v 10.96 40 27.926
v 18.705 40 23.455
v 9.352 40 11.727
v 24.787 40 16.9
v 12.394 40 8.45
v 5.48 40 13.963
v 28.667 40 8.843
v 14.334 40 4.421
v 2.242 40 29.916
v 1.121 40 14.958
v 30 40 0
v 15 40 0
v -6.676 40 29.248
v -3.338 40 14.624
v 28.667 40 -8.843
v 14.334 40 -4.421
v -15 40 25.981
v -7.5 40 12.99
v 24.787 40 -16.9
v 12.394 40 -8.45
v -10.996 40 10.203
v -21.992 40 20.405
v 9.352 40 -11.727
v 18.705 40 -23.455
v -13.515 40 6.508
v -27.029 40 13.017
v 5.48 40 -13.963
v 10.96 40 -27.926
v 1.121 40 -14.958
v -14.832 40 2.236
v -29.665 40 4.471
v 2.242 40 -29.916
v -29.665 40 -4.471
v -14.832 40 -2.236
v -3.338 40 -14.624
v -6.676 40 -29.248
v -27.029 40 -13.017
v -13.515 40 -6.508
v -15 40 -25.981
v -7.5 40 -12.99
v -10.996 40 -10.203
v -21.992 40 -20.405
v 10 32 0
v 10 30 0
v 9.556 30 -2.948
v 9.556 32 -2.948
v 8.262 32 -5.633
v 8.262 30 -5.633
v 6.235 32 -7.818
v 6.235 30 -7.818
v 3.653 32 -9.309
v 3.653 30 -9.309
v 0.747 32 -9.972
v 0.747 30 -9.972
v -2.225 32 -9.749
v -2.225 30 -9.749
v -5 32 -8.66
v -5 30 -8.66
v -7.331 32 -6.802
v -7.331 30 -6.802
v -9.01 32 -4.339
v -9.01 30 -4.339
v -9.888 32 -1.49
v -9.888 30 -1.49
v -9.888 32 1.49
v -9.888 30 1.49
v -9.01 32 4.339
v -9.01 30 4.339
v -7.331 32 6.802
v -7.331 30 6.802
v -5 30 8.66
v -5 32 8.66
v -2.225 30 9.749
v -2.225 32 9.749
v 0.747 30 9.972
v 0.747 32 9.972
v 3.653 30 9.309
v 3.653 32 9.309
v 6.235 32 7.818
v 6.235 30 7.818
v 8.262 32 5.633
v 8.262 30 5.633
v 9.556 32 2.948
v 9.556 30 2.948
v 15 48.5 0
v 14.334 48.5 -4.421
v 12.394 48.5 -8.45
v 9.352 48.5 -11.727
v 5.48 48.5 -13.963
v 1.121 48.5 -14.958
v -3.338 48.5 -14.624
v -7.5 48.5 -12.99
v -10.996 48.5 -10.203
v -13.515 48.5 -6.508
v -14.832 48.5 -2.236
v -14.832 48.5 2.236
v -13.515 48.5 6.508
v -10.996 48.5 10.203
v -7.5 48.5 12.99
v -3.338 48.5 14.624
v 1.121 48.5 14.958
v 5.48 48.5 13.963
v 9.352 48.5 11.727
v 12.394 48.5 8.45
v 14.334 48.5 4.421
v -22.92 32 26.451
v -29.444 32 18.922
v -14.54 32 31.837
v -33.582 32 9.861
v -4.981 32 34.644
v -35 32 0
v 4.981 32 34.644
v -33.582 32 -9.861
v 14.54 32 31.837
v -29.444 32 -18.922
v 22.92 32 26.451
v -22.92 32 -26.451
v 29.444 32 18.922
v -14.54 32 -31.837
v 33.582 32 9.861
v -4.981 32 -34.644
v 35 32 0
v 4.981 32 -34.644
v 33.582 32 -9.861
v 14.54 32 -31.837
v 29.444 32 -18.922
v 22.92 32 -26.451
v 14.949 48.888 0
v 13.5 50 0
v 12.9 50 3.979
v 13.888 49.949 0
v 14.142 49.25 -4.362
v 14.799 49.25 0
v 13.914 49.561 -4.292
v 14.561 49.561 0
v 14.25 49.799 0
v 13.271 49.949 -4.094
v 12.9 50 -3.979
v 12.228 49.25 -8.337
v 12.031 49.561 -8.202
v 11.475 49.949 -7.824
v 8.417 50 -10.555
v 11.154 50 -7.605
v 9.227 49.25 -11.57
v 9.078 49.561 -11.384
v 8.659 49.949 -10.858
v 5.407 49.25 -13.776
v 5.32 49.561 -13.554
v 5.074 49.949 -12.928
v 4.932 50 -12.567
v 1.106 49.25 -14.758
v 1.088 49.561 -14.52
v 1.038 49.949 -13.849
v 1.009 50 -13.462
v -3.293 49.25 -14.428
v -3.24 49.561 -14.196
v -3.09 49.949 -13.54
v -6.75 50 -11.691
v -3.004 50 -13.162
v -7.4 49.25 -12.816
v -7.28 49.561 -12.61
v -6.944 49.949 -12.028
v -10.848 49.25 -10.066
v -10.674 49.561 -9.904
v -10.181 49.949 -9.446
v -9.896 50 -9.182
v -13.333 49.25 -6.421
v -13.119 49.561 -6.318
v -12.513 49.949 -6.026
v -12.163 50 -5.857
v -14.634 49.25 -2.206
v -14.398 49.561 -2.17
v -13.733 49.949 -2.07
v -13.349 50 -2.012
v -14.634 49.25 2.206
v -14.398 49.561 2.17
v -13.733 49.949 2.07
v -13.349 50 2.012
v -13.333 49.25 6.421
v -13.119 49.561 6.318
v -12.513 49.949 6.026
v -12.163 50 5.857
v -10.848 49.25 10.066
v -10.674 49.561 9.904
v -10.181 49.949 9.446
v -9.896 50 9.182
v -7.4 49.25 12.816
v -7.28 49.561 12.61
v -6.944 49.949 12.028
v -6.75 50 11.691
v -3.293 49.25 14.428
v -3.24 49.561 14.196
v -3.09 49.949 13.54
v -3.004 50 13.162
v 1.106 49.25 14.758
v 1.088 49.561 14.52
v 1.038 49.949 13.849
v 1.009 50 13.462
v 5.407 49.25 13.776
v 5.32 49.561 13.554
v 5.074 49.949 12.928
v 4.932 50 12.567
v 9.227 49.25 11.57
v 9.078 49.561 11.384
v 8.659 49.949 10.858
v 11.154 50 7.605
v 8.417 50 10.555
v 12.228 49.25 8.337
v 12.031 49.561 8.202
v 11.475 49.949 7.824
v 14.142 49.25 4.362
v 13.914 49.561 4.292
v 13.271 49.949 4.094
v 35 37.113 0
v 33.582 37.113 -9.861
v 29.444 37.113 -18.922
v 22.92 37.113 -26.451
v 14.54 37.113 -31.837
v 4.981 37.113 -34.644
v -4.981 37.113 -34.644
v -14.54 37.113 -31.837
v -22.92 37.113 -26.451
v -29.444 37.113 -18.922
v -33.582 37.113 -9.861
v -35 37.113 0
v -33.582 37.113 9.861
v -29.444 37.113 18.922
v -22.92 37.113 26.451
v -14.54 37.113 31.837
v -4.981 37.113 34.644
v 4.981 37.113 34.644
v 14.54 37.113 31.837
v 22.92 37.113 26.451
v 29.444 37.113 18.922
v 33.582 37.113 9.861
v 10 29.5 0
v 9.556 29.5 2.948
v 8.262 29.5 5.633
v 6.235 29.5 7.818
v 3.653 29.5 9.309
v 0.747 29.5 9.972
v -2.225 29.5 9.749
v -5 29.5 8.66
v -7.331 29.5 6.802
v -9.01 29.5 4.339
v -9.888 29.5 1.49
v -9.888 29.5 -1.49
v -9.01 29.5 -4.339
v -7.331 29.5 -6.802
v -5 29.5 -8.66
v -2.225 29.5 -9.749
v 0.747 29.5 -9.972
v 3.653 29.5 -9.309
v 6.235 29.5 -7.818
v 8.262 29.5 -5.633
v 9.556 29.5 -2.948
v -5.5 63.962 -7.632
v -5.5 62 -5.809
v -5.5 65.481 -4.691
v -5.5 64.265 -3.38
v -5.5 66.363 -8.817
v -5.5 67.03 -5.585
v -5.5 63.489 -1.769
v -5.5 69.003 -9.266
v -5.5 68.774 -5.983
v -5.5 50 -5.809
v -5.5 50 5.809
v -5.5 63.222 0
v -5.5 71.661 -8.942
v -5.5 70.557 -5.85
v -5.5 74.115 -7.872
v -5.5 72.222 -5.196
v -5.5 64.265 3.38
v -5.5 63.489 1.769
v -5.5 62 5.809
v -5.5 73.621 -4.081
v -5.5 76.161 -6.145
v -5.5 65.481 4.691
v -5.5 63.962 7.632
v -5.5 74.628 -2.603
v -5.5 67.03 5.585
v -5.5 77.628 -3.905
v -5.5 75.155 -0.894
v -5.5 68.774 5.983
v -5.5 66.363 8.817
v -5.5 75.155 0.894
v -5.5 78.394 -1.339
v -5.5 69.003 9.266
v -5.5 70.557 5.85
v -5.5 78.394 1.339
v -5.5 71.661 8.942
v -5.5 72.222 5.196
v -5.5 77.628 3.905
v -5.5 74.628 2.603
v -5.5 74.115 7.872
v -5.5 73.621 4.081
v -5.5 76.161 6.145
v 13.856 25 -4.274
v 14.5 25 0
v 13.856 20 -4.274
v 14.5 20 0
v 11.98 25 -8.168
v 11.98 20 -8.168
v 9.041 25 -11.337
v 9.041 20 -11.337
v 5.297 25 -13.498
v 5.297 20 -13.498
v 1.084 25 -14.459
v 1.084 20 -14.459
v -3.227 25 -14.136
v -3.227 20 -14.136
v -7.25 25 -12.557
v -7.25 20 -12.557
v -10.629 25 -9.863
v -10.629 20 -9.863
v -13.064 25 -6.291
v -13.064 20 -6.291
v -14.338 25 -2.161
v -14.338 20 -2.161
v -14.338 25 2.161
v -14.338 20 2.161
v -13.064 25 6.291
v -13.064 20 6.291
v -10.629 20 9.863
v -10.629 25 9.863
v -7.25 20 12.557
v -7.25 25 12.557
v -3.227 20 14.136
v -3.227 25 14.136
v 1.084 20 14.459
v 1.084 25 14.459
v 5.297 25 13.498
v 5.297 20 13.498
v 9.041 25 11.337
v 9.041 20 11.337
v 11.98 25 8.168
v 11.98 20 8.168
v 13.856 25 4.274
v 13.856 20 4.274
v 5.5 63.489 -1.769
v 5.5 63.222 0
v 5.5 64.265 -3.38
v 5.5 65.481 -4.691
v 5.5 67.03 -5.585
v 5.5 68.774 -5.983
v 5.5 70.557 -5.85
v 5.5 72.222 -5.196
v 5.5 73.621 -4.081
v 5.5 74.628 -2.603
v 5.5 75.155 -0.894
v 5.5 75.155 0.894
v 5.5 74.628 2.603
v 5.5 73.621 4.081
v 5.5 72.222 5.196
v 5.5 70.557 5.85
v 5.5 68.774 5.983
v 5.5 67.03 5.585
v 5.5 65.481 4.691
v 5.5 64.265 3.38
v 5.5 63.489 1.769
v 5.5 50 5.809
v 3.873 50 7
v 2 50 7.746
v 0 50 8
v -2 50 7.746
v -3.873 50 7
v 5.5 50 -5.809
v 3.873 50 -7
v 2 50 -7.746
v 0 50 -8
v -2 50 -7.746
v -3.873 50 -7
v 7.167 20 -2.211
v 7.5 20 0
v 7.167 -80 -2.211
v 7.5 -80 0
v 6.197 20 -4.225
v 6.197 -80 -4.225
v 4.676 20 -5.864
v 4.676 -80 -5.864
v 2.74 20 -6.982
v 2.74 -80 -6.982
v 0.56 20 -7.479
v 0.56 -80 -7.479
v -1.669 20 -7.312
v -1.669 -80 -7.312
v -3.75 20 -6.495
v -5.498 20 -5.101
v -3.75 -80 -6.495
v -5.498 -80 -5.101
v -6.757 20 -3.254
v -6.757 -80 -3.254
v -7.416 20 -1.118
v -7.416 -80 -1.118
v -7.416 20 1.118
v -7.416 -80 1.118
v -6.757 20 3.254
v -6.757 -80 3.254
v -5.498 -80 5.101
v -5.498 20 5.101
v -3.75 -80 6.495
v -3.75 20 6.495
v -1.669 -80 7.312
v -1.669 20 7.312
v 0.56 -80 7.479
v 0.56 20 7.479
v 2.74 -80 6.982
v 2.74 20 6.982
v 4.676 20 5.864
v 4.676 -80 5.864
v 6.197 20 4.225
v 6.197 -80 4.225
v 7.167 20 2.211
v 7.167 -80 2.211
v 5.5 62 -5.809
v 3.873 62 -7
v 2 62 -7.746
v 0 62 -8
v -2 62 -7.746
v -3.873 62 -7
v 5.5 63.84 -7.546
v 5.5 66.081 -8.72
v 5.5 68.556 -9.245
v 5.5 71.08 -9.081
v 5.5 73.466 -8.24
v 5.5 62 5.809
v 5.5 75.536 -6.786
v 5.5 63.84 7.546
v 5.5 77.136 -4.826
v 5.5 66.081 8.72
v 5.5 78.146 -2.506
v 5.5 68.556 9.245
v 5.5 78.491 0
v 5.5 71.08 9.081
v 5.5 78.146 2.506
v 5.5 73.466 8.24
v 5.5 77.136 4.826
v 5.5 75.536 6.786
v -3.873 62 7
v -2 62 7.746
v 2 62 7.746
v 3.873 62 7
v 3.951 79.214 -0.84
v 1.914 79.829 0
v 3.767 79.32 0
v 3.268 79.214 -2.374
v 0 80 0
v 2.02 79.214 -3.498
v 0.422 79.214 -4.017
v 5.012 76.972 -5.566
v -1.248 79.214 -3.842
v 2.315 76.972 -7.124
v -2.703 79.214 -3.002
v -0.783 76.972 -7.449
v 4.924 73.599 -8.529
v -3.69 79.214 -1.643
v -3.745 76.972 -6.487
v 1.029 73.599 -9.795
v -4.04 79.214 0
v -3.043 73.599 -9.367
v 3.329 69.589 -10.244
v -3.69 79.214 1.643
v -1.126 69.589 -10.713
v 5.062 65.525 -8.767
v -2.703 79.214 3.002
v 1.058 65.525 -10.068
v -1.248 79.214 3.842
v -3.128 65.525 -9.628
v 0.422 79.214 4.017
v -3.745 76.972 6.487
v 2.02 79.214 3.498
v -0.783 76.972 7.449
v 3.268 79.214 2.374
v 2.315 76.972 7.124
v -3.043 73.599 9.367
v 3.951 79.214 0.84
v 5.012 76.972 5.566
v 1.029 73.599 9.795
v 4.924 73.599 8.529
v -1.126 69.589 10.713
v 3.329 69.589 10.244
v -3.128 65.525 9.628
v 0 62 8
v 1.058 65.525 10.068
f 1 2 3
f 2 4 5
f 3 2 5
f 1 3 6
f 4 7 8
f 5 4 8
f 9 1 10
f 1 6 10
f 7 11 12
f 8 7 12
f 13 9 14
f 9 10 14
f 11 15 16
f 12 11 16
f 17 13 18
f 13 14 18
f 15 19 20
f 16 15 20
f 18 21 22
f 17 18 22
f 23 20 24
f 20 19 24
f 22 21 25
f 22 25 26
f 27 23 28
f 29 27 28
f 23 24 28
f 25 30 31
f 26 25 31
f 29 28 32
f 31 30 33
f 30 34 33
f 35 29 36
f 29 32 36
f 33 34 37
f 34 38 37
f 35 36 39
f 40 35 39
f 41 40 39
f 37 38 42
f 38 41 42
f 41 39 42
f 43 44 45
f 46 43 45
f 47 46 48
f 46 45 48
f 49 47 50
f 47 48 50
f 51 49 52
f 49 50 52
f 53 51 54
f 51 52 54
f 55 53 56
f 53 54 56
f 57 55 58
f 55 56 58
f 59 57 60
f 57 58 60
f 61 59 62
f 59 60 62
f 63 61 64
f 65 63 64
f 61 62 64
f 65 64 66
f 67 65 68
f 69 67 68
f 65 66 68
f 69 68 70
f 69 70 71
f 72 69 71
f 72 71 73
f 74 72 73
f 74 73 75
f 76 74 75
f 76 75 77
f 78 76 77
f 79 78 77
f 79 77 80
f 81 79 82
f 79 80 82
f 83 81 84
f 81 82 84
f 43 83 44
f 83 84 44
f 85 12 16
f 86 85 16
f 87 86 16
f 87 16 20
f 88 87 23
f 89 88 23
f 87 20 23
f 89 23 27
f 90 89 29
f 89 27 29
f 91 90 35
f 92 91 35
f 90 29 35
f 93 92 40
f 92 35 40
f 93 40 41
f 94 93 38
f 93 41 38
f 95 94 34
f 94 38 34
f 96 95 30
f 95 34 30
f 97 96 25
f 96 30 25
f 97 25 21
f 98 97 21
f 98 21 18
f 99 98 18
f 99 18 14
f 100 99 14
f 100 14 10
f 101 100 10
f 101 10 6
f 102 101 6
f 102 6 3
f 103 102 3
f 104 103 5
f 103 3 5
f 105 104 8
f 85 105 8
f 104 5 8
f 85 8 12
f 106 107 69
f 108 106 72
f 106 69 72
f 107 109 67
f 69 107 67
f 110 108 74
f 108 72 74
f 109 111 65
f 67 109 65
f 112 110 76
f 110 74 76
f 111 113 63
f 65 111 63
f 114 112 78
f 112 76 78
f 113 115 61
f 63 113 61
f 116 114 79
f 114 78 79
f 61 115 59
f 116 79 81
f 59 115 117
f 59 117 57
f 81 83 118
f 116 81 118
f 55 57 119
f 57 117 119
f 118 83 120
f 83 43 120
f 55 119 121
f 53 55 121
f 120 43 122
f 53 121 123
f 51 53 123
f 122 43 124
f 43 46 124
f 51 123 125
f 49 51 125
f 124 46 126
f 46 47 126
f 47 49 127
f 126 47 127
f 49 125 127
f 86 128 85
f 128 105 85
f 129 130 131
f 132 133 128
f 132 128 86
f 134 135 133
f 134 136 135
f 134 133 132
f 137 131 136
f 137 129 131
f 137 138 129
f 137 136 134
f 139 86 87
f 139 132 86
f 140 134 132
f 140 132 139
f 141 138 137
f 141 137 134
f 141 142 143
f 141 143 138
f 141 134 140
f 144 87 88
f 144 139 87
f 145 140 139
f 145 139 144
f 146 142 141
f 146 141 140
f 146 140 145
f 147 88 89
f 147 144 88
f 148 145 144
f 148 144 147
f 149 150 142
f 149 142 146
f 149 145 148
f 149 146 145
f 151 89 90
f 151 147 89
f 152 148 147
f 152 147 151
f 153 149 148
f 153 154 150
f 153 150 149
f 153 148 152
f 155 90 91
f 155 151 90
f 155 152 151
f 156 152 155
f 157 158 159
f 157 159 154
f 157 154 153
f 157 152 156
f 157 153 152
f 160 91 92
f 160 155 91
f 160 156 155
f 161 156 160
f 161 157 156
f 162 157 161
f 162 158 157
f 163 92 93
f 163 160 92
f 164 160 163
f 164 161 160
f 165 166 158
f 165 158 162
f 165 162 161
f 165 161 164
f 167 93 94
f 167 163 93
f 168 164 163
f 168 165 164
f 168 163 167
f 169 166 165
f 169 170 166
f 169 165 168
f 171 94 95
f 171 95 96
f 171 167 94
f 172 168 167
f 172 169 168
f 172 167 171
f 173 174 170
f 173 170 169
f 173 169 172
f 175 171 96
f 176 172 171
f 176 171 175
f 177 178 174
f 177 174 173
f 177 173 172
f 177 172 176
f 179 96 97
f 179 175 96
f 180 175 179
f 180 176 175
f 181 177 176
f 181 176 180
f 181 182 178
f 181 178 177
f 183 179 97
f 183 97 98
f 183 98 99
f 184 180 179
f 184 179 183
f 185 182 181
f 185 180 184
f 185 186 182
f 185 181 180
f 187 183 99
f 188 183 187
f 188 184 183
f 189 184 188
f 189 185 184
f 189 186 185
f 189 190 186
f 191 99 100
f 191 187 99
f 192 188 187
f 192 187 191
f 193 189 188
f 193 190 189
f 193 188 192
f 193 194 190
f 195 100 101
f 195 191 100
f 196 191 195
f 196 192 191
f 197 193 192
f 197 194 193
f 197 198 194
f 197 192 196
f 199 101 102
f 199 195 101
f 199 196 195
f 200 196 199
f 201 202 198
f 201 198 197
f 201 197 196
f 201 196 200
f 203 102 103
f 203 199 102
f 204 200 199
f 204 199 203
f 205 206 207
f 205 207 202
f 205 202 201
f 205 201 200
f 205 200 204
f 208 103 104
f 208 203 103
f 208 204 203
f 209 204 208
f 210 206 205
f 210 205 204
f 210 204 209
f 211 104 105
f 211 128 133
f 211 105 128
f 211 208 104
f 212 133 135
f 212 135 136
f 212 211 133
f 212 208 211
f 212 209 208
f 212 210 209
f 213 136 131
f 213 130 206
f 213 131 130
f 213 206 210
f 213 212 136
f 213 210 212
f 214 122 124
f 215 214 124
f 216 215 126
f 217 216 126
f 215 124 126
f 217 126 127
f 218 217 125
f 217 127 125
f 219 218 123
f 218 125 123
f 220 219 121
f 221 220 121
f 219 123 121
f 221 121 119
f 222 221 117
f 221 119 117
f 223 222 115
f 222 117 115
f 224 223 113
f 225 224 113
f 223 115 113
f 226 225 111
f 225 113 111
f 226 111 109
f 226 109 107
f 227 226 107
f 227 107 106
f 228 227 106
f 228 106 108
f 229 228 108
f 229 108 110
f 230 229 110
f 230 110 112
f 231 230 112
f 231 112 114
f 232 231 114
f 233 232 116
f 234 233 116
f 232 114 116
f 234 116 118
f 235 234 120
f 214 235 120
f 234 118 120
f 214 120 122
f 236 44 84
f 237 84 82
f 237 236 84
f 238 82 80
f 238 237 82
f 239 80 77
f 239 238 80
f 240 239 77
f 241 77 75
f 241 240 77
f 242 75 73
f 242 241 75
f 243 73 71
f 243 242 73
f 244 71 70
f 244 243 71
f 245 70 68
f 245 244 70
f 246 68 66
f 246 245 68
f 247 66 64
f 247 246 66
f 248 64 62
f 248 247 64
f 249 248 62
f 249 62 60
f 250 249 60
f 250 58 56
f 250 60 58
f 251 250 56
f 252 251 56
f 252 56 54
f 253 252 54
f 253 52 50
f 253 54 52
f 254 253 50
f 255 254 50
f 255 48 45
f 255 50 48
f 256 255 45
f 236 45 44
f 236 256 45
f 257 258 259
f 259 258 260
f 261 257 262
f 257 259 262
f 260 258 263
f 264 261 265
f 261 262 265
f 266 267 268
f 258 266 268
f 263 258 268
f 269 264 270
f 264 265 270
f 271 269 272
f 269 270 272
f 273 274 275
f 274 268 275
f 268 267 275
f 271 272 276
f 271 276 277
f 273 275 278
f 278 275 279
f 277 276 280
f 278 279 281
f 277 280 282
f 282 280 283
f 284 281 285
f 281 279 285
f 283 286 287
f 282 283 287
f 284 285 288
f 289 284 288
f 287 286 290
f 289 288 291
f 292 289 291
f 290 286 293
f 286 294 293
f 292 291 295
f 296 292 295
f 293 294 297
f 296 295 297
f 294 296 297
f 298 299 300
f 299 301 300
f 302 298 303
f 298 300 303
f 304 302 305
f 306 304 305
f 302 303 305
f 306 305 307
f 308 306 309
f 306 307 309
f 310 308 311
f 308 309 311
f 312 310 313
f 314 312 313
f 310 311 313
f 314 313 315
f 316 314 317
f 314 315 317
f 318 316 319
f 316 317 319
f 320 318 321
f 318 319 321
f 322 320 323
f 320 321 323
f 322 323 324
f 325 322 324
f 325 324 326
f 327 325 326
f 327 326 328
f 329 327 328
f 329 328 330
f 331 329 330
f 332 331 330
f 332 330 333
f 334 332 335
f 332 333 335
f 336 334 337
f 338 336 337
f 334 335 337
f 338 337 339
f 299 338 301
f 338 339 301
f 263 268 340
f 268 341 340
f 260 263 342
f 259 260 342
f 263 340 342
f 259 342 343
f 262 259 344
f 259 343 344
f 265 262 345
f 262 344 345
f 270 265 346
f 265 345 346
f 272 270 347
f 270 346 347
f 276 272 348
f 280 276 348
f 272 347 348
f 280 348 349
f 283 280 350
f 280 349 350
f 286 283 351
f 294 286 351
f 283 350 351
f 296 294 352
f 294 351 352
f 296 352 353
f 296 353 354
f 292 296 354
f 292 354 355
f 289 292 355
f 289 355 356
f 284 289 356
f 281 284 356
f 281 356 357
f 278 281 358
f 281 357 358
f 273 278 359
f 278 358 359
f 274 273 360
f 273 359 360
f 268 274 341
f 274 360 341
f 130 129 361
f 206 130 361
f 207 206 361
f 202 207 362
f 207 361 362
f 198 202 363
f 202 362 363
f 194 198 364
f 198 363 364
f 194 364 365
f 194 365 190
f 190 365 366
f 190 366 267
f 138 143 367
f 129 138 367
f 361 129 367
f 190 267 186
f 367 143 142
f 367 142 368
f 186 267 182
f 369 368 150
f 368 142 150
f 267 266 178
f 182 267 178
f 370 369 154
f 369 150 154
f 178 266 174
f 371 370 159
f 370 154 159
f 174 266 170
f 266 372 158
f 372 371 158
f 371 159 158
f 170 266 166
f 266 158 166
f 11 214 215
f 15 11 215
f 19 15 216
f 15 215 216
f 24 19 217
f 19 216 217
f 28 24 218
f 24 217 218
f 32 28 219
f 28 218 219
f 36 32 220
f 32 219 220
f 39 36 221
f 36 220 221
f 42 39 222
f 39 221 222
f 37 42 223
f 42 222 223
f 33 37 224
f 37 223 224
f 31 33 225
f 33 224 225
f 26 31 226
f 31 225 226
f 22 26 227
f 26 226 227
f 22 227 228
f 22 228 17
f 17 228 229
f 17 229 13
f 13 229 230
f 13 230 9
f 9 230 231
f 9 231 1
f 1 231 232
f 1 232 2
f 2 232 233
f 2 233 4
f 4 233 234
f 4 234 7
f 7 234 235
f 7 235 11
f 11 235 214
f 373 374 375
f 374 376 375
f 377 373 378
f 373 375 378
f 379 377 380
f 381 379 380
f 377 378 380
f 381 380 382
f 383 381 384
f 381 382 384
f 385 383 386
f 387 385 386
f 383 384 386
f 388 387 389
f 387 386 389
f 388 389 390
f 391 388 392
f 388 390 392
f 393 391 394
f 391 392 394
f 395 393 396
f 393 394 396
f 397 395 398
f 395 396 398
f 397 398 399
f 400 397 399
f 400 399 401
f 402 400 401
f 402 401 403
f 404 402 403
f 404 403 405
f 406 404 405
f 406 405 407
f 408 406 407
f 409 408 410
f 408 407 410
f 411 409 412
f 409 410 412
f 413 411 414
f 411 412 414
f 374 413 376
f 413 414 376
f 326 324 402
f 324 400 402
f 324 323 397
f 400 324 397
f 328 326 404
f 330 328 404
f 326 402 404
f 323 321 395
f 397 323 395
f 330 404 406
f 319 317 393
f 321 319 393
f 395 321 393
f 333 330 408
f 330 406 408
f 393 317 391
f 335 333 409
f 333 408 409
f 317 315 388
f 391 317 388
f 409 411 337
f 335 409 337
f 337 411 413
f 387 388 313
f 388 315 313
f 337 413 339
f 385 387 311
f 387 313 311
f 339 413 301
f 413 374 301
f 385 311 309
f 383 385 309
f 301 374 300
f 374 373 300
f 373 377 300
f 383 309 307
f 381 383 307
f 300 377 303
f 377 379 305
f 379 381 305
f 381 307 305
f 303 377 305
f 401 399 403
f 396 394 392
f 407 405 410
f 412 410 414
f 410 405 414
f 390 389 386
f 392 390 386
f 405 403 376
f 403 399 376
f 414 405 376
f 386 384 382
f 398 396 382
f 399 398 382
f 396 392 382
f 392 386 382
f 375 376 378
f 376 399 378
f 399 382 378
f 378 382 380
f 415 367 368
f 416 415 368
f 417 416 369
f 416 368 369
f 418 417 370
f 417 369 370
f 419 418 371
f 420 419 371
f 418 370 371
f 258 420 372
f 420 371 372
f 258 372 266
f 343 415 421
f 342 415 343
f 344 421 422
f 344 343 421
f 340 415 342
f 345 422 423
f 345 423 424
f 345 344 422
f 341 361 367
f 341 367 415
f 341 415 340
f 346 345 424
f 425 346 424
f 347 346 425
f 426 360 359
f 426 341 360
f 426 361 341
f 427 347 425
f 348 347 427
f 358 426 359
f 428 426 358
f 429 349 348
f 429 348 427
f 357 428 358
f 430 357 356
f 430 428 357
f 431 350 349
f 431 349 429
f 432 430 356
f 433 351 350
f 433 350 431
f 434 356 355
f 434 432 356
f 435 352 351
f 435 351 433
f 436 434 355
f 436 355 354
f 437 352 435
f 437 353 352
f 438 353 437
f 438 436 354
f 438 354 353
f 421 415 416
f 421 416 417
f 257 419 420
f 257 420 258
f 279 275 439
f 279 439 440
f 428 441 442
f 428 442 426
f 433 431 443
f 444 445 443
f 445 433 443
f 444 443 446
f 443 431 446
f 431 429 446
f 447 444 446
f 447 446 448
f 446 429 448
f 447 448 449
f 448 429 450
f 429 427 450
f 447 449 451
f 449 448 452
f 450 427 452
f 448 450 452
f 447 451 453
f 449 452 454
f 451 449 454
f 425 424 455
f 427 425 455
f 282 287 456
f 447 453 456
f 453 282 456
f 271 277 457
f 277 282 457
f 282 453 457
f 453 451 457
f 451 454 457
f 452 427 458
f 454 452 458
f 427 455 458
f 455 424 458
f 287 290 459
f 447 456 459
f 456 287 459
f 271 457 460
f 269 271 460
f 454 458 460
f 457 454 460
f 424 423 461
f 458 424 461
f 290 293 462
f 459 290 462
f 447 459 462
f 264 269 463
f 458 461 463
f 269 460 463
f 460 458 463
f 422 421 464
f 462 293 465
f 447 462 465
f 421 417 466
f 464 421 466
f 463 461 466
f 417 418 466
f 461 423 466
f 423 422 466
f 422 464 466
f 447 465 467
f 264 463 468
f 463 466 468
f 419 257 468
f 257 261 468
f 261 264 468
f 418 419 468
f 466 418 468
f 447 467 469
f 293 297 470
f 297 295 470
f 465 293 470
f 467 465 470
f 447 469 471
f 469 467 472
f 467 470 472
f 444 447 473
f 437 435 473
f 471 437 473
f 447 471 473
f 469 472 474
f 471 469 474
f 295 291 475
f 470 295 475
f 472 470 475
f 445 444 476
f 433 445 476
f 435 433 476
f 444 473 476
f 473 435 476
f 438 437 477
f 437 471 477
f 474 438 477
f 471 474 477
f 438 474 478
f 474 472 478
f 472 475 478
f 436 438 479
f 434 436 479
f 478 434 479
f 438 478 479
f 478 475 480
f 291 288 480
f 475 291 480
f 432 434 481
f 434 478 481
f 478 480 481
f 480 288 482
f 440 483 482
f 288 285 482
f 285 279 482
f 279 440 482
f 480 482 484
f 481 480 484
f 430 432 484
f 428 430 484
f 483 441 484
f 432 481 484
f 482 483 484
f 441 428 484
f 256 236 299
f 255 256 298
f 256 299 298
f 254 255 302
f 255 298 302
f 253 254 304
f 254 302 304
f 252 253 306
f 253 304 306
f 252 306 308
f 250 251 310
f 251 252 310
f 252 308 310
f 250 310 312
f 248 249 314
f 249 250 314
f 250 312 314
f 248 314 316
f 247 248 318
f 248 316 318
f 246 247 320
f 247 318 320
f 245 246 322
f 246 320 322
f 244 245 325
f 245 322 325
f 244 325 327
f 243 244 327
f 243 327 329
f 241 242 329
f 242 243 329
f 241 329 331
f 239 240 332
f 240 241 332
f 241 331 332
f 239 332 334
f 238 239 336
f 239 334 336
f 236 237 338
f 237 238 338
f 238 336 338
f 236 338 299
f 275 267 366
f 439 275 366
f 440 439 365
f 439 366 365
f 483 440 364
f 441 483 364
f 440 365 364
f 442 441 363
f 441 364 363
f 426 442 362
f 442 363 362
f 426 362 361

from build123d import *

# Parameters (mm, degrees)
CHAFL_N1_SIZE         = 5
CHAFL_N2_SIZE         = 5
CHAFL_N2_SIZE2        = 2.886751346
REDONDEO1_R           = 1.5
CORTAR_EXTRUIR1_DEPTH = 40
CROQUIS3_R            = 6
CORTAR_EXTRUIR2_DEPTH = 40


with BuildPart() as part:
    # Croquis1 → Revolución1 (revolve)
    with BuildSketch(Plane.XY, mode=Mode.PRIVATE) as revoluci_n1_sk:
        with BuildLine():
            Line((0, -80), (0, 80))
            ThreePointArc((0, 80), (-9.848857802, 73.599492356), (-8, 62))
            Line((-8, 62), (-8, 50))
            Line((-8, 50), (-15, 50))
            Line((-15, 50), (-15, 40))
            Line((-15, 40), (-35, 40))
            Line((-35, 40), (-35, 32))
            Line((-35, 32), (-10, 32))
            Line((-10, 32), (-10, 30))
            Line((-10, 30), (-14.5, 30))
            Line((-14.5, 30), (-14.5, 20))
            Line((-14.5, 20), (-7.5, 20))
            Line((-7.5, 20), (-7.5, -80))
            Line((-7.5, -80), (0, -80))
        make_face()
    revolve(revoluci_n1_sk.sketch.rotate(Axis((0, -80, 0), (0, 1, 0)), 180), axis=Axis((0, -80, 0), (0, 1, 0)))

    # Chaflán1
    # the kernel refuses this chamfer: 5 mm, written as the material it takes off along each edge
    with BuildSketch(Plane(origin=(0, 30, 0), x_dir=(1, 0, 0), z_dir=(0, 0, 1))) as chafl_n1_piece_1_section:
        Polygon((14.5 - CHAFL_N1_SIZE, 0), (14.5, -CHAFL_N1_SIZE), (14.5, 0), align=None)
    chafl_n1_piece_1 = revolve(axis=Axis((0, 30, 0), (0, 1, 0)), mode=Mode.PRIVATE)
    chafl_n1_piece_1 = chafl_n1_piece_1 - Plane(origin=(0, 27.252174823, 0), x_dir=(1, 0, 0), z_dir=(0, -1, 0)) * Cylinder(10, 58, mode=Mode.PRIVATE)
    add(chafl_n1_piece_1, mode=Mode.SUBTRACT)

    # Chaflán2
    chafl_n2_edges = [part.edges().sort_by_distance(p)[0] for p in [
        (-35, 40, 0),
    ]]
    chafl_n2_side = [part.faces().sort_by_distance(p)[0] for p in [
        (-15.989949494, 40, 0),
    ]]
    chamfer(chafl_n2_edges, length=CHAFL_N2_SIZE, length2=CHAFL_N2_SIZE2, reference=chafl_n2_side[0])

    # Redondeo1
    redondeo1_edges = [part.edges().sort_by_distance(p)[0] for p in [
        (-15, 50, 0),
    ]]
    fillet(redondeo1_edges, radius=REDONDEO1_R)

    # Croquis2 → Cortar-Extruir1 (cut, symmetric)
    with BuildSketch(Plane.XY):
        Polygon((-13.5, 50), (-5.5, 50), (-5.5, 83.023482793), (-17.692901936, 83.023482793), (-17.692901936, 50), align=None)
    cortar_extruir1 = extrude(amount=CORTAR_EXTRUIR1_DEPTH, both=True, mode=Mode.SUBTRACT)

    # Simetría1: Cortar-Extruir1 across plane
    add(cortar_extruir1.mirror(Plane(origin=(0, 0, 0), x_dir=(0, 0, 1), z_dir=(1, 0, 0))), mode=Mode.SUBTRACT)

    # Croquis3 → Cortar-Extruir2 (cut, symmetric)
    with BuildSketch(Plane(origin=(5.5, 0, 0), x_dir=(0, 0, -1), z_dir=(1, 0, 0))):
        with Locations(Location((0, 69.222222222, 0), (0, 0, 270))):
            Circle(CROQUIS3_R)
    extrude(amount=CORTAR_EXTRUIR2_DEPTH, both=True, mode=Mode.SUBTRACT)


solid = part.part
